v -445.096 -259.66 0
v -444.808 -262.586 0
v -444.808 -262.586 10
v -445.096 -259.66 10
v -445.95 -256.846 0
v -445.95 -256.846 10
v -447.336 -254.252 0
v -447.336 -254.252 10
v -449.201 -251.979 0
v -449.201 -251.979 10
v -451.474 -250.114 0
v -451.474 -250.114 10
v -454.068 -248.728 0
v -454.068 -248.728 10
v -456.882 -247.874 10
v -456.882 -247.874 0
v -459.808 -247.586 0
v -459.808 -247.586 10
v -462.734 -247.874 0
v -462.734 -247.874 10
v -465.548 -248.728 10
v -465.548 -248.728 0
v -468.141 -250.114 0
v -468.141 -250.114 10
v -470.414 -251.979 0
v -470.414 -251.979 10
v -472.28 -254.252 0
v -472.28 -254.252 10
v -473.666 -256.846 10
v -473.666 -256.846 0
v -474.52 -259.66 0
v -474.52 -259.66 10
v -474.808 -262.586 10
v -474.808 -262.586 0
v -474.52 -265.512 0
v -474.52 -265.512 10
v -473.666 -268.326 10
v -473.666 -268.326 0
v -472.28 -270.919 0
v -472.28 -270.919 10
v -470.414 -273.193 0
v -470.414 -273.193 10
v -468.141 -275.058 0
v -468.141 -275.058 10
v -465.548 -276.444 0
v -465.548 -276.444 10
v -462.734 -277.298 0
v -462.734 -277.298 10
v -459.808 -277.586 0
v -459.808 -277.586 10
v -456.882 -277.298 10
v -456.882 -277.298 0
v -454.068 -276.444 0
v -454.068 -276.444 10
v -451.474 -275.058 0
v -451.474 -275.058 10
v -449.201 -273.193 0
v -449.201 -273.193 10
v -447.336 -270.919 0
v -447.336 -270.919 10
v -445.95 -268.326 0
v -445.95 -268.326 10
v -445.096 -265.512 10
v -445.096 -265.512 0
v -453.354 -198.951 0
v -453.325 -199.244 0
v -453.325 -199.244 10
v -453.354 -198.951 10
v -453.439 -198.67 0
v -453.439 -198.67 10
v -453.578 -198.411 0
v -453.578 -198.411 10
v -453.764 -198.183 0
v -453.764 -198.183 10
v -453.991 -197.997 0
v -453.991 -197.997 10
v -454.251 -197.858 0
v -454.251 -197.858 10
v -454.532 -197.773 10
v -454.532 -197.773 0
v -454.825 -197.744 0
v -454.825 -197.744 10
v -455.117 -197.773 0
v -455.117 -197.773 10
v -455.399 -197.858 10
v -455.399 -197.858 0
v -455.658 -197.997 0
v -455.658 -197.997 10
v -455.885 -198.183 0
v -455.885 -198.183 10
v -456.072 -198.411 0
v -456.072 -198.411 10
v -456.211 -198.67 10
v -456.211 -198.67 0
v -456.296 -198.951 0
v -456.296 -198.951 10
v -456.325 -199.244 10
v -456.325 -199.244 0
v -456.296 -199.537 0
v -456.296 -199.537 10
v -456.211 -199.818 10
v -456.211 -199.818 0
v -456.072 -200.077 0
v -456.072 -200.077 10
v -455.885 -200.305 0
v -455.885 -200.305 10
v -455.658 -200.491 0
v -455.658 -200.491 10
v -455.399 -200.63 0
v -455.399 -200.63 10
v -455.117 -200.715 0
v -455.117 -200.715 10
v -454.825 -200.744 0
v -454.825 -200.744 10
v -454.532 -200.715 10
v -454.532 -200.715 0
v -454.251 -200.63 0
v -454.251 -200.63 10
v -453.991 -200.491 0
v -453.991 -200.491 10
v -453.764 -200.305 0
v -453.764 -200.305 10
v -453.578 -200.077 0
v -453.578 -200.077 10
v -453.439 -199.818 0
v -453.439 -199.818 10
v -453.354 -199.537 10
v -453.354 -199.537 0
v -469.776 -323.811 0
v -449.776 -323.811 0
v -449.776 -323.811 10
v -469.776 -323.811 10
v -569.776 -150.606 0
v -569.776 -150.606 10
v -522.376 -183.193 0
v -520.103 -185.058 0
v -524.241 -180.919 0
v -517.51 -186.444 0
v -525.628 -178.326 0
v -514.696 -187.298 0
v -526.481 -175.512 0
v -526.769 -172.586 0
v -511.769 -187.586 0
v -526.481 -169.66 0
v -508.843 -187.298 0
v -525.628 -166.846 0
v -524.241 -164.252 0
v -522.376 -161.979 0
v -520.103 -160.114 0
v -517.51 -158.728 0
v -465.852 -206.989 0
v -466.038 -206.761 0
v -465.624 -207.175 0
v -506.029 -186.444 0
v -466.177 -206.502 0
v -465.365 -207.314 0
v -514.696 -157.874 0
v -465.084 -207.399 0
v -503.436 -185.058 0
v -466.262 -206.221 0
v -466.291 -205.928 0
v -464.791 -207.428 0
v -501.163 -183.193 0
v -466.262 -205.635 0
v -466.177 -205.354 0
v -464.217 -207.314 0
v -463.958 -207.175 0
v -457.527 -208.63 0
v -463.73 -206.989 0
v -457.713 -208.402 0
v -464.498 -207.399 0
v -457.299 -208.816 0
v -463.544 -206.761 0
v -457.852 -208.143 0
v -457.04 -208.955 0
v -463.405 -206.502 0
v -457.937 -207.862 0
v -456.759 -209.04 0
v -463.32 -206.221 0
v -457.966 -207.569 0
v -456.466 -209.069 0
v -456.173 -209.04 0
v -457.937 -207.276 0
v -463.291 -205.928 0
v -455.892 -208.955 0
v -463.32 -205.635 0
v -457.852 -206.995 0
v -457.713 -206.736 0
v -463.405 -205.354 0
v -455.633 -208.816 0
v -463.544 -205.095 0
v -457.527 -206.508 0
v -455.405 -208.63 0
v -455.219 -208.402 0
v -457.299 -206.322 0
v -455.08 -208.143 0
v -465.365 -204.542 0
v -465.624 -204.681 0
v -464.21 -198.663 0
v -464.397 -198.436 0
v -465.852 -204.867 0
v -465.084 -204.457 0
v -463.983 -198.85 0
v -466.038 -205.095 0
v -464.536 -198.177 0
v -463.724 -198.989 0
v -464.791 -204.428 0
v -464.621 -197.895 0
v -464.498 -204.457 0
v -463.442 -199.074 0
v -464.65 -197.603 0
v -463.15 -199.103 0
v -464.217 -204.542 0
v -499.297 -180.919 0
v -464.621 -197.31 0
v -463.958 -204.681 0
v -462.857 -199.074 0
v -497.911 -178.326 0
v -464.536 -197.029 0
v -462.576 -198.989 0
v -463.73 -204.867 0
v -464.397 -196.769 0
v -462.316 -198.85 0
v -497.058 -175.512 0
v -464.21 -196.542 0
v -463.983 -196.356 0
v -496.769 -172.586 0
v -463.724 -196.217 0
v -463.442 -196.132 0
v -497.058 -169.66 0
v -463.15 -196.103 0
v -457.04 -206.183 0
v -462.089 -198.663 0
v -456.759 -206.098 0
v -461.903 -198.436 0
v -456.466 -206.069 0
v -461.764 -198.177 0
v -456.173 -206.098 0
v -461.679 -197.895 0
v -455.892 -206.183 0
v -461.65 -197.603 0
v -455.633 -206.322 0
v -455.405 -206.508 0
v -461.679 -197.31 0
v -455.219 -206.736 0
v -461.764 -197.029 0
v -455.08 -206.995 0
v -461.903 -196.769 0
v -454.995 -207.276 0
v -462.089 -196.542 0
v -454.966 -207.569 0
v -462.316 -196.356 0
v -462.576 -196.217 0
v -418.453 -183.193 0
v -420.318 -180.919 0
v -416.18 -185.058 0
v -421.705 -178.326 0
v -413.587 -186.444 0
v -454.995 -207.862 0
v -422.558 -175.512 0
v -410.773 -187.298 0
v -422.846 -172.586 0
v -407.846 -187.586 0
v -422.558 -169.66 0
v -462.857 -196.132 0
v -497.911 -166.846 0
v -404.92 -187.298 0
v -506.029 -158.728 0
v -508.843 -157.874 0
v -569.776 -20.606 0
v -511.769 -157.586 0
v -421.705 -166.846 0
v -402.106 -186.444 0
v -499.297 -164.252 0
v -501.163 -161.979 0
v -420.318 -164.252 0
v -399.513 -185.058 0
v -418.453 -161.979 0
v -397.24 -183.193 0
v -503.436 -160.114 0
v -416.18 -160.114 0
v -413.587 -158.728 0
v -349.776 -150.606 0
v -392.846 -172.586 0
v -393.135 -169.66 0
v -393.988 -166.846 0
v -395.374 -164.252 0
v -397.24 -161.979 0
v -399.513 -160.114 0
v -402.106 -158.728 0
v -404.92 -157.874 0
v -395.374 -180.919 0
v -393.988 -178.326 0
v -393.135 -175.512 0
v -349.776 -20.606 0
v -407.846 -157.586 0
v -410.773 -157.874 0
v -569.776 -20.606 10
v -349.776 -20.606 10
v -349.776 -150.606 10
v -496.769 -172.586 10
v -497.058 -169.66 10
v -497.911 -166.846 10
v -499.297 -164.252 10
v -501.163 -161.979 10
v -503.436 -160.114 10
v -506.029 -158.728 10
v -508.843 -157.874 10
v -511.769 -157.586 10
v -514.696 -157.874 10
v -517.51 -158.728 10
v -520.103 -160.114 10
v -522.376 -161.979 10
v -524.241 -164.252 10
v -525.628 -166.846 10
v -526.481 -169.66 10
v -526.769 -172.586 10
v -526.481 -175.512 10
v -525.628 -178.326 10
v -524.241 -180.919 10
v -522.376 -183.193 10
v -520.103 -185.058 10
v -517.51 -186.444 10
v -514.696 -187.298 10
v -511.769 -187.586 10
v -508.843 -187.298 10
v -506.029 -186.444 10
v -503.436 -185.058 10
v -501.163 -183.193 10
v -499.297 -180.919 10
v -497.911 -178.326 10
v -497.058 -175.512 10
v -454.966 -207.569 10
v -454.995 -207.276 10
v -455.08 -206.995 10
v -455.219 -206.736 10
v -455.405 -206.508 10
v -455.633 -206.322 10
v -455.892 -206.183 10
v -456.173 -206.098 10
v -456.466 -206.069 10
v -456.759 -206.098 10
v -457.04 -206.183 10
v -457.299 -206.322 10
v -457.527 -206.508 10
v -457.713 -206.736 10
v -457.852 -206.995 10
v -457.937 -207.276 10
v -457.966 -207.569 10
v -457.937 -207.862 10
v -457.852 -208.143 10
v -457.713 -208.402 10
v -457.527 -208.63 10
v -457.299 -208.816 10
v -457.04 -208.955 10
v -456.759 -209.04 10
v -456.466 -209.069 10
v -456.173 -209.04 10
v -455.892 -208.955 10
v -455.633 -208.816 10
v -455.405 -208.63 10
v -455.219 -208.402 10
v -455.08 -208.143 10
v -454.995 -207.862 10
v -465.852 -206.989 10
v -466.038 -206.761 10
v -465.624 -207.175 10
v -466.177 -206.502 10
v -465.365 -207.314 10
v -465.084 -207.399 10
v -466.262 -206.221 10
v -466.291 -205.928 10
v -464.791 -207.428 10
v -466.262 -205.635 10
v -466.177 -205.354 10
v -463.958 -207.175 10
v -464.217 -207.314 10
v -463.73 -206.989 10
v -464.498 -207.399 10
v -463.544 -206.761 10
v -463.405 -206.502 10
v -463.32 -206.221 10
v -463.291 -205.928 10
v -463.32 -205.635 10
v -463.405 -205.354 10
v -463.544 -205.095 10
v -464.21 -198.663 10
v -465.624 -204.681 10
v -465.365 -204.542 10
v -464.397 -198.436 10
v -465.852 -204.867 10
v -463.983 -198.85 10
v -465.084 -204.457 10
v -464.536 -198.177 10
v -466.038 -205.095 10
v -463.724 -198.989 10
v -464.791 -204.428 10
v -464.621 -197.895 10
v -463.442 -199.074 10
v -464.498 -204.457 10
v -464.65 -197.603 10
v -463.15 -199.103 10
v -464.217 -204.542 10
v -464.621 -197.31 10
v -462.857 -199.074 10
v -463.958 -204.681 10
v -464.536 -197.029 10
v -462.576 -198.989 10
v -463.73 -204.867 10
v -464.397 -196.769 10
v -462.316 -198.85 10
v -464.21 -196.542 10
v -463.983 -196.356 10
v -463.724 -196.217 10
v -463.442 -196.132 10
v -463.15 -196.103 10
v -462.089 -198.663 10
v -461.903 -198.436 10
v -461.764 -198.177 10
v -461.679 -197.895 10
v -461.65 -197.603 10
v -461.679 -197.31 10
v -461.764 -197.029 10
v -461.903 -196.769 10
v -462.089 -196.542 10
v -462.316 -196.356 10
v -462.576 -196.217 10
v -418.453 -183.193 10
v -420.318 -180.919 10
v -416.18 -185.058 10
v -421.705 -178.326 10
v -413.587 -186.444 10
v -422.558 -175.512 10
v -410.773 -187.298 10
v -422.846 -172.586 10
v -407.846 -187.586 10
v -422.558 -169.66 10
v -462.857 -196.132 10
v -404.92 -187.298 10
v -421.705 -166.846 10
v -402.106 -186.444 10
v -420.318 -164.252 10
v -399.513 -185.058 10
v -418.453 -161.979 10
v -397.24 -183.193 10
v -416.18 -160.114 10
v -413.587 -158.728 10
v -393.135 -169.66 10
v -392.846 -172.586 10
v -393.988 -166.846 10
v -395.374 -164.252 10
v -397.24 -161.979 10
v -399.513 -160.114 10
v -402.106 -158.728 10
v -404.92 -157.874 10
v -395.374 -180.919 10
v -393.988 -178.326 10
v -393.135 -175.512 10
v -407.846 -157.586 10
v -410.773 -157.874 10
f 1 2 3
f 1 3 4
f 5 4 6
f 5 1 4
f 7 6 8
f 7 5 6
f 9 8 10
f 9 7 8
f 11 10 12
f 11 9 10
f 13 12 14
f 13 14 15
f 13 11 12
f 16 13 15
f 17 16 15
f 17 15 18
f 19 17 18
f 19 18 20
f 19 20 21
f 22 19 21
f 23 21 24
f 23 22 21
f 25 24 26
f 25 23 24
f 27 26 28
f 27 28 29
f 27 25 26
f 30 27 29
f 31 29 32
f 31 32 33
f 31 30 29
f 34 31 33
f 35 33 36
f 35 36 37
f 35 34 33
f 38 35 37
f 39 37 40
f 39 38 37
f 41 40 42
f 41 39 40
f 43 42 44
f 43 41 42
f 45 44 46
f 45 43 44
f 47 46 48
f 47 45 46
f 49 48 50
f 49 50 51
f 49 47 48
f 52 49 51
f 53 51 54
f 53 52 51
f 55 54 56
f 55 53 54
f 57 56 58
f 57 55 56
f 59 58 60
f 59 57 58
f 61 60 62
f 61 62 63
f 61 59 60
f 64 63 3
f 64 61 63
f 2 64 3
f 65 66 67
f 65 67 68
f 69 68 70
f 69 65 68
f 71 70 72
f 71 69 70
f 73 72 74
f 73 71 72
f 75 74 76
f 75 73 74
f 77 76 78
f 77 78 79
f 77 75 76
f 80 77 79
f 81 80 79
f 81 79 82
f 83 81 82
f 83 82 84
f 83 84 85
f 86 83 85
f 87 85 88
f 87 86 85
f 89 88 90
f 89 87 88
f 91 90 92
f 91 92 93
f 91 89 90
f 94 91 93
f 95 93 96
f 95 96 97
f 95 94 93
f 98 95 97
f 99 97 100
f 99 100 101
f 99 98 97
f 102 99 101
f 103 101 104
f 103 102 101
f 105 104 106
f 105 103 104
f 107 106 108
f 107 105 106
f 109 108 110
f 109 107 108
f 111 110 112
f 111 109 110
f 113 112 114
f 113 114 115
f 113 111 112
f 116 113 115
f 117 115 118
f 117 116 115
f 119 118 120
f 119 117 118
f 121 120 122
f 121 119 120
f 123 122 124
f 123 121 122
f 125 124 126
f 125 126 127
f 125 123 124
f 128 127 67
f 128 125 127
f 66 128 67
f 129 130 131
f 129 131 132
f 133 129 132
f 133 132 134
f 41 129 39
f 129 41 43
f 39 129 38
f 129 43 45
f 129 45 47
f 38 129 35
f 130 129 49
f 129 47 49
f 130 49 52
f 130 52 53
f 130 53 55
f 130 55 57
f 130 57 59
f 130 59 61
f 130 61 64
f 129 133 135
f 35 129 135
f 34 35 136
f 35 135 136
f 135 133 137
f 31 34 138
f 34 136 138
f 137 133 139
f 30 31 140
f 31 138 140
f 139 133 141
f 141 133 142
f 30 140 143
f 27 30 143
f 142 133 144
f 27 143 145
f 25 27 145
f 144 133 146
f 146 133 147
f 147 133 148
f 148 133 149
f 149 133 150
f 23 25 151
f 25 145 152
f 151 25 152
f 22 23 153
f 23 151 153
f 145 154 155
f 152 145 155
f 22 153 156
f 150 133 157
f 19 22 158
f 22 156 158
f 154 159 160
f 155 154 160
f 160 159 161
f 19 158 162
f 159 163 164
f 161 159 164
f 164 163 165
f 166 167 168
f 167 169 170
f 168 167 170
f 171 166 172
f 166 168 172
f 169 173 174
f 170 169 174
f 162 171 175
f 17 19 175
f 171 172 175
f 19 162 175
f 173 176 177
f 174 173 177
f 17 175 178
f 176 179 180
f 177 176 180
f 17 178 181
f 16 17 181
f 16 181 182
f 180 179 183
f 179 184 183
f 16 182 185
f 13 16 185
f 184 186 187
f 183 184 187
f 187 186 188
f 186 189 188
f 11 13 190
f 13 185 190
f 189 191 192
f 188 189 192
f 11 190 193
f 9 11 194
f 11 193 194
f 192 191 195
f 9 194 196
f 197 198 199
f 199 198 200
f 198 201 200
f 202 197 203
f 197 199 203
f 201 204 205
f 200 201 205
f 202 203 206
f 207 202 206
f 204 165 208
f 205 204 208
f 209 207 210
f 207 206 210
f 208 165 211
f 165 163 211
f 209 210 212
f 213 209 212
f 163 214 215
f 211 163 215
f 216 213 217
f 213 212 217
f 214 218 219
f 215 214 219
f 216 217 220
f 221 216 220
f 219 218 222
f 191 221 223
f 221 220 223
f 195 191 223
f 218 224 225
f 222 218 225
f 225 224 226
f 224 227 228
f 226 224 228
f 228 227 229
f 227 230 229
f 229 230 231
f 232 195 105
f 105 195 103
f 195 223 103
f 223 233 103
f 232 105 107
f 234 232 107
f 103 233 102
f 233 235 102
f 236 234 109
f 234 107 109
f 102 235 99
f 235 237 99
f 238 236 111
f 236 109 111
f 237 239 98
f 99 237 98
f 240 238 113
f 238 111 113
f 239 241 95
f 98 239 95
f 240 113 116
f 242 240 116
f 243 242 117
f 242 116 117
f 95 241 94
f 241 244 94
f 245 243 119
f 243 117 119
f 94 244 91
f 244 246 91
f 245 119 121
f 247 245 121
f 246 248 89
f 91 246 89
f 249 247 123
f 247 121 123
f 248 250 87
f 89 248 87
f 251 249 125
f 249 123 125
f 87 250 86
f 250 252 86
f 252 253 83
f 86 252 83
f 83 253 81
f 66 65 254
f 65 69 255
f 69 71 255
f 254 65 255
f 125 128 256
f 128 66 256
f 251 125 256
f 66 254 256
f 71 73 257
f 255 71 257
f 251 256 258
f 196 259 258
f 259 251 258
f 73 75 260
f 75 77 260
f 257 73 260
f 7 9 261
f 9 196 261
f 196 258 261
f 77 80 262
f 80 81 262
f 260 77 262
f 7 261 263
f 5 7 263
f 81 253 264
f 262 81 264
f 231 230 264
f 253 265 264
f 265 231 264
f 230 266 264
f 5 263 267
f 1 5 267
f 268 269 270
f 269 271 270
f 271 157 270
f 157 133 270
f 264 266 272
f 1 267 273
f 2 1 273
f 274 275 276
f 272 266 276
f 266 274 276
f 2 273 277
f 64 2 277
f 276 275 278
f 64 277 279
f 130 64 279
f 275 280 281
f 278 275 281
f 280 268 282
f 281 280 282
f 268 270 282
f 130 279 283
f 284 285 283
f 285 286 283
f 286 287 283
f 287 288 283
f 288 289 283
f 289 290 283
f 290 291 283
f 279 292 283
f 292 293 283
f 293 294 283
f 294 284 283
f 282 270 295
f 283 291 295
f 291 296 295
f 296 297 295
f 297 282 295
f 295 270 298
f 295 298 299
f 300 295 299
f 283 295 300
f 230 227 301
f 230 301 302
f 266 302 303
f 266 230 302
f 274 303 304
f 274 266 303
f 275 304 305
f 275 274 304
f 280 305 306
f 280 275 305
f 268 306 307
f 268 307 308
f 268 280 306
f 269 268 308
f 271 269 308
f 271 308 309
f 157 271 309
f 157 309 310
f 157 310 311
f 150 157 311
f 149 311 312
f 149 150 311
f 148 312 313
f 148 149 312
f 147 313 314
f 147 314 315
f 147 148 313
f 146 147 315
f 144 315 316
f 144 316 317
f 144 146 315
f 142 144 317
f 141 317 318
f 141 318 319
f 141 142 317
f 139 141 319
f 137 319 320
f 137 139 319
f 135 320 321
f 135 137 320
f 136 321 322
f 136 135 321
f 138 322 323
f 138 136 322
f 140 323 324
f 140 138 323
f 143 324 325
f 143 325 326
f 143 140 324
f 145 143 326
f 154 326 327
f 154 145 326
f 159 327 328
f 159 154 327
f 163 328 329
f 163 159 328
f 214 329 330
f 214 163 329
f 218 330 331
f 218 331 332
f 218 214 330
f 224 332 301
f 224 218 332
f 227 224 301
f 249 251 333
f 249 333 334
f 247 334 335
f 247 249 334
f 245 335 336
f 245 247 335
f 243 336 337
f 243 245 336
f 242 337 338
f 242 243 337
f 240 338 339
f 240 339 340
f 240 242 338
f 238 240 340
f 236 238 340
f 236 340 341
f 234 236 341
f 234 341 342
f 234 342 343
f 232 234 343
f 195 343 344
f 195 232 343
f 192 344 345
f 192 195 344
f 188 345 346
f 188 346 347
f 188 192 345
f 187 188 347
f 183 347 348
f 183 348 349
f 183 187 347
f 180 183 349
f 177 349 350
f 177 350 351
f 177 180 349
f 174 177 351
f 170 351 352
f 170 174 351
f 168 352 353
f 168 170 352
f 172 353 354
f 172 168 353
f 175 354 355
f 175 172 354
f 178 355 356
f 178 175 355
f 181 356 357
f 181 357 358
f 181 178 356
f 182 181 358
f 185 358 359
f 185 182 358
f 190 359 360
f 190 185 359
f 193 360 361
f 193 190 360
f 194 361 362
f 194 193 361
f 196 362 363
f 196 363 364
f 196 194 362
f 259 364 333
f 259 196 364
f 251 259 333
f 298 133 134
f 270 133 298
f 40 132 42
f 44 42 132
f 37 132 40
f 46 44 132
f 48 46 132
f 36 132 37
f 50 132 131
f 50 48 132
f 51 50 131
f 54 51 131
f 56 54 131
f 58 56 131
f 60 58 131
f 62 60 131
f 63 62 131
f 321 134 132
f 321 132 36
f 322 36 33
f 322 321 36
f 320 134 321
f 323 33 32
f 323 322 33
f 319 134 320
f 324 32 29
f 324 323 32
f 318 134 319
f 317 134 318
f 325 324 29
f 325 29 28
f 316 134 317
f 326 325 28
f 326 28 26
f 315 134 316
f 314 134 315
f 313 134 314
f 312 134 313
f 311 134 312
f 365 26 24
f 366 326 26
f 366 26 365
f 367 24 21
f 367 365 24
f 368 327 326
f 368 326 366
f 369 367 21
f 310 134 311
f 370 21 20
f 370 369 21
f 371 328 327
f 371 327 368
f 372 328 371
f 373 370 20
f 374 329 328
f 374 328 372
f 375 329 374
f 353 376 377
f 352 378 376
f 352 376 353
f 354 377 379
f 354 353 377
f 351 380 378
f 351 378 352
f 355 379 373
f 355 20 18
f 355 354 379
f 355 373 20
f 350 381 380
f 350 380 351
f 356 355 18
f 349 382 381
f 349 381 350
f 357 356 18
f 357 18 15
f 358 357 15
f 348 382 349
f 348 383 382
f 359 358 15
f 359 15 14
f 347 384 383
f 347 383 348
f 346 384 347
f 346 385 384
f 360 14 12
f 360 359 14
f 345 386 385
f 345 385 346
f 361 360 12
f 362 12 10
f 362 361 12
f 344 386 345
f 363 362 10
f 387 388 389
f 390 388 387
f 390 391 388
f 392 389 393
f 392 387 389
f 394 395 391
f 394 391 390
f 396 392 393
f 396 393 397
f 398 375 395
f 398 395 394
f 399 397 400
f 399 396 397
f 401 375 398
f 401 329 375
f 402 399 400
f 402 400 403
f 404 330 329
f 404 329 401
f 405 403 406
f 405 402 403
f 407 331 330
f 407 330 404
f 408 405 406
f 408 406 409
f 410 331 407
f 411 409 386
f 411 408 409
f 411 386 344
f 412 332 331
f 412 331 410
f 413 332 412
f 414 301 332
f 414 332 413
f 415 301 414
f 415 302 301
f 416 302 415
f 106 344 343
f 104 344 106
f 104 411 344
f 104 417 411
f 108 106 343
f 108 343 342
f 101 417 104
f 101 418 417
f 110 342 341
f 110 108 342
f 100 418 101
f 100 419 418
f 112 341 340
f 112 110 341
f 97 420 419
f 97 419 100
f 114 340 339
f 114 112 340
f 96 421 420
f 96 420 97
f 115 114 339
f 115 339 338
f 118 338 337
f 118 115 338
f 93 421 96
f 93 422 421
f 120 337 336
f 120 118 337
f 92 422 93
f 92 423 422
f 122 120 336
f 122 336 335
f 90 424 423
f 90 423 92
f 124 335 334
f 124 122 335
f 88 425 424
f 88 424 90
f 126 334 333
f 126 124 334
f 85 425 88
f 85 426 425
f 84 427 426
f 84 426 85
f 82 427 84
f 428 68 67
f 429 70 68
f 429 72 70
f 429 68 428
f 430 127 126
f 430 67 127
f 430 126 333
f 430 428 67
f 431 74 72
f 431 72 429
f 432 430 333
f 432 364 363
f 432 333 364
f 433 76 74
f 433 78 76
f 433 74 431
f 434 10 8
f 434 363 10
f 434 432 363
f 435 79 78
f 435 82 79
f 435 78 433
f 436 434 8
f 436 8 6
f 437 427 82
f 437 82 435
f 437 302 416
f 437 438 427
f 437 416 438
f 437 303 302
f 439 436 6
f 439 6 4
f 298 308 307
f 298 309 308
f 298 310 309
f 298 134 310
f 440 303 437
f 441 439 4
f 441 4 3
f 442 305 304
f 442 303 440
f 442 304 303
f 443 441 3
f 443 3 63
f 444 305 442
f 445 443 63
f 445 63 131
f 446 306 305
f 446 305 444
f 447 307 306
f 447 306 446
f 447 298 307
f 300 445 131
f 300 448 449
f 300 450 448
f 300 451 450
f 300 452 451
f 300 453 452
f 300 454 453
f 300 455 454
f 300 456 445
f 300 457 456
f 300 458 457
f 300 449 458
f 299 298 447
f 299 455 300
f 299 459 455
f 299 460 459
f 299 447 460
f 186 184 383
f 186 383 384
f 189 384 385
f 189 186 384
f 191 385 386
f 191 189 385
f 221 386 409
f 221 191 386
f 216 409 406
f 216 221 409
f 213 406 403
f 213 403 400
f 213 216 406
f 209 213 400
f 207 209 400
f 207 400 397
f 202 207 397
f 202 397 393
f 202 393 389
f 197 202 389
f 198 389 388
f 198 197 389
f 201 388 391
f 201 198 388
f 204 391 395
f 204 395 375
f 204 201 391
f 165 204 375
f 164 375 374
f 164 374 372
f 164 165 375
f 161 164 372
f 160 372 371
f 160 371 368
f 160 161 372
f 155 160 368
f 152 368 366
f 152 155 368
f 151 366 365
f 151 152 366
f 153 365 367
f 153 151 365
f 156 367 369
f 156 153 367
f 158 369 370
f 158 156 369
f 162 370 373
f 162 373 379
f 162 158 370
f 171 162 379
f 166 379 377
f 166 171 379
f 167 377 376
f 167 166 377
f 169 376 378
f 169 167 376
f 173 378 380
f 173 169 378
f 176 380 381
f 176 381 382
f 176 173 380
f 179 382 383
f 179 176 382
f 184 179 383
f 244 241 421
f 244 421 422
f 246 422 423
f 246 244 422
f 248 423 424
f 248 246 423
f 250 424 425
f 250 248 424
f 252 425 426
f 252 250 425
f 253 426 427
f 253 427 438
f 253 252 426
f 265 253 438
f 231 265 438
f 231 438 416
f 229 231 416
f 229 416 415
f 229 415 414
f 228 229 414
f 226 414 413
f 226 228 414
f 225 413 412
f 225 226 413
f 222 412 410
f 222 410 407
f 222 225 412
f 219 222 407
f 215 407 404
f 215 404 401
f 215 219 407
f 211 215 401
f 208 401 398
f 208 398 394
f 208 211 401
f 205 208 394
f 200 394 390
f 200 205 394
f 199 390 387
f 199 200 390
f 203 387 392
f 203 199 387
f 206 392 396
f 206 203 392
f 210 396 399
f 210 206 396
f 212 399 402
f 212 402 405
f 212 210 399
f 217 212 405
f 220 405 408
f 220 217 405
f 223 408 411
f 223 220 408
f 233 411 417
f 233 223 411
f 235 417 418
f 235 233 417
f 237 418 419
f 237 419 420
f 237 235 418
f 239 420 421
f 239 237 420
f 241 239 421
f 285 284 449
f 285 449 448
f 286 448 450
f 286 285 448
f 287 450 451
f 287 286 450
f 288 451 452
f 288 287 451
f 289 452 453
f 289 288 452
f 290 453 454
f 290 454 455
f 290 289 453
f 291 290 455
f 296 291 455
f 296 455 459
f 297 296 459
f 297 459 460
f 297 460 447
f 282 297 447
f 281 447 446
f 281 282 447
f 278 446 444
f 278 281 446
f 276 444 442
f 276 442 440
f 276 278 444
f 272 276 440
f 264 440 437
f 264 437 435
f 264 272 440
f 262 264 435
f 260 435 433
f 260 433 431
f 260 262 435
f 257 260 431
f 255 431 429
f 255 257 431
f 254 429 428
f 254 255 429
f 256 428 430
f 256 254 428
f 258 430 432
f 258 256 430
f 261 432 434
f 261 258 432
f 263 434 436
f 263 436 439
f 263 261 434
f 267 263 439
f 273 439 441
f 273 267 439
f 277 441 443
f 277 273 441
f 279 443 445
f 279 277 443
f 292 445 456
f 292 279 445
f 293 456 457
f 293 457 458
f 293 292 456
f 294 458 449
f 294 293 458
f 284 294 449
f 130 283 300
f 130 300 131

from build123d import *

# Parameters (mm, degrees)
SKETCH5_R           = 15
SKETCH5_R_2         = 10
SKETCH5_R_3         = 1.5
BOSS_EXTRUDE1_DEPTH = 10


with BuildPart() as part:
    # Sketch5 → Boss-Extrude1 (new body)
    # profile 1 of 2: a face of its own
    with BuildSketch(Plane.XY):
        Polygon((-349.776309557, -150.606198532), (-449.776309557, -323.811279288), (-469.776309557, -323.811279288), (-569.776309557, -150.606198532), (-569.776309557, -20.606198532), (-349.776309557, -20.606198532), align=None)
        with Locations((-459.807870528, -262.585944494)):
            Circle(SKETCH5_R, mode=Mode.SUBTRACT)
        with Locations((-511.769394755, -172.585944494)):
            Circle(SKETCH5_R, mode=Mode.SUBTRACT)
        with Locations((-459.807870528, -202.585944494)):
            Circle(SKETCH5_R_2, mode=Mode.SUBTRACT)
        with Locations((-407.846346301, -172.585944494)):
            Circle(SKETCH5_R, mode=Mode.SUBTRACT)
    # profile 2 of 2: a face of its own
    with BuildSketch(Plane.XY):
        with Locations((-459.807870528, -202.585944494)):
            Circle(SKETCH5_R_2)
        with Locations((-464.790983154, -205.927888323)):
            Circle(SKETCH5_R_3, mode=Mode.SUBTRACT)
        with Locations((-456.465926699, -207.56905712)):
            Circle(SKETCH5_R_3, mode=Mode.SUBTRACT)
        with Locations((-454.824757902, -199.244000664)):
            Circle(SKETCH5_R_3, mode=Mode.SUBTRACT)
        with Locations((-463.149814357, -197.602831868)):
            Circle(SKETCH5_R_3, mode=Mode.SUBTRACT)
    extrude(amount=BOSS_EXTRUDE1_DEPTH)


solid = part.part
